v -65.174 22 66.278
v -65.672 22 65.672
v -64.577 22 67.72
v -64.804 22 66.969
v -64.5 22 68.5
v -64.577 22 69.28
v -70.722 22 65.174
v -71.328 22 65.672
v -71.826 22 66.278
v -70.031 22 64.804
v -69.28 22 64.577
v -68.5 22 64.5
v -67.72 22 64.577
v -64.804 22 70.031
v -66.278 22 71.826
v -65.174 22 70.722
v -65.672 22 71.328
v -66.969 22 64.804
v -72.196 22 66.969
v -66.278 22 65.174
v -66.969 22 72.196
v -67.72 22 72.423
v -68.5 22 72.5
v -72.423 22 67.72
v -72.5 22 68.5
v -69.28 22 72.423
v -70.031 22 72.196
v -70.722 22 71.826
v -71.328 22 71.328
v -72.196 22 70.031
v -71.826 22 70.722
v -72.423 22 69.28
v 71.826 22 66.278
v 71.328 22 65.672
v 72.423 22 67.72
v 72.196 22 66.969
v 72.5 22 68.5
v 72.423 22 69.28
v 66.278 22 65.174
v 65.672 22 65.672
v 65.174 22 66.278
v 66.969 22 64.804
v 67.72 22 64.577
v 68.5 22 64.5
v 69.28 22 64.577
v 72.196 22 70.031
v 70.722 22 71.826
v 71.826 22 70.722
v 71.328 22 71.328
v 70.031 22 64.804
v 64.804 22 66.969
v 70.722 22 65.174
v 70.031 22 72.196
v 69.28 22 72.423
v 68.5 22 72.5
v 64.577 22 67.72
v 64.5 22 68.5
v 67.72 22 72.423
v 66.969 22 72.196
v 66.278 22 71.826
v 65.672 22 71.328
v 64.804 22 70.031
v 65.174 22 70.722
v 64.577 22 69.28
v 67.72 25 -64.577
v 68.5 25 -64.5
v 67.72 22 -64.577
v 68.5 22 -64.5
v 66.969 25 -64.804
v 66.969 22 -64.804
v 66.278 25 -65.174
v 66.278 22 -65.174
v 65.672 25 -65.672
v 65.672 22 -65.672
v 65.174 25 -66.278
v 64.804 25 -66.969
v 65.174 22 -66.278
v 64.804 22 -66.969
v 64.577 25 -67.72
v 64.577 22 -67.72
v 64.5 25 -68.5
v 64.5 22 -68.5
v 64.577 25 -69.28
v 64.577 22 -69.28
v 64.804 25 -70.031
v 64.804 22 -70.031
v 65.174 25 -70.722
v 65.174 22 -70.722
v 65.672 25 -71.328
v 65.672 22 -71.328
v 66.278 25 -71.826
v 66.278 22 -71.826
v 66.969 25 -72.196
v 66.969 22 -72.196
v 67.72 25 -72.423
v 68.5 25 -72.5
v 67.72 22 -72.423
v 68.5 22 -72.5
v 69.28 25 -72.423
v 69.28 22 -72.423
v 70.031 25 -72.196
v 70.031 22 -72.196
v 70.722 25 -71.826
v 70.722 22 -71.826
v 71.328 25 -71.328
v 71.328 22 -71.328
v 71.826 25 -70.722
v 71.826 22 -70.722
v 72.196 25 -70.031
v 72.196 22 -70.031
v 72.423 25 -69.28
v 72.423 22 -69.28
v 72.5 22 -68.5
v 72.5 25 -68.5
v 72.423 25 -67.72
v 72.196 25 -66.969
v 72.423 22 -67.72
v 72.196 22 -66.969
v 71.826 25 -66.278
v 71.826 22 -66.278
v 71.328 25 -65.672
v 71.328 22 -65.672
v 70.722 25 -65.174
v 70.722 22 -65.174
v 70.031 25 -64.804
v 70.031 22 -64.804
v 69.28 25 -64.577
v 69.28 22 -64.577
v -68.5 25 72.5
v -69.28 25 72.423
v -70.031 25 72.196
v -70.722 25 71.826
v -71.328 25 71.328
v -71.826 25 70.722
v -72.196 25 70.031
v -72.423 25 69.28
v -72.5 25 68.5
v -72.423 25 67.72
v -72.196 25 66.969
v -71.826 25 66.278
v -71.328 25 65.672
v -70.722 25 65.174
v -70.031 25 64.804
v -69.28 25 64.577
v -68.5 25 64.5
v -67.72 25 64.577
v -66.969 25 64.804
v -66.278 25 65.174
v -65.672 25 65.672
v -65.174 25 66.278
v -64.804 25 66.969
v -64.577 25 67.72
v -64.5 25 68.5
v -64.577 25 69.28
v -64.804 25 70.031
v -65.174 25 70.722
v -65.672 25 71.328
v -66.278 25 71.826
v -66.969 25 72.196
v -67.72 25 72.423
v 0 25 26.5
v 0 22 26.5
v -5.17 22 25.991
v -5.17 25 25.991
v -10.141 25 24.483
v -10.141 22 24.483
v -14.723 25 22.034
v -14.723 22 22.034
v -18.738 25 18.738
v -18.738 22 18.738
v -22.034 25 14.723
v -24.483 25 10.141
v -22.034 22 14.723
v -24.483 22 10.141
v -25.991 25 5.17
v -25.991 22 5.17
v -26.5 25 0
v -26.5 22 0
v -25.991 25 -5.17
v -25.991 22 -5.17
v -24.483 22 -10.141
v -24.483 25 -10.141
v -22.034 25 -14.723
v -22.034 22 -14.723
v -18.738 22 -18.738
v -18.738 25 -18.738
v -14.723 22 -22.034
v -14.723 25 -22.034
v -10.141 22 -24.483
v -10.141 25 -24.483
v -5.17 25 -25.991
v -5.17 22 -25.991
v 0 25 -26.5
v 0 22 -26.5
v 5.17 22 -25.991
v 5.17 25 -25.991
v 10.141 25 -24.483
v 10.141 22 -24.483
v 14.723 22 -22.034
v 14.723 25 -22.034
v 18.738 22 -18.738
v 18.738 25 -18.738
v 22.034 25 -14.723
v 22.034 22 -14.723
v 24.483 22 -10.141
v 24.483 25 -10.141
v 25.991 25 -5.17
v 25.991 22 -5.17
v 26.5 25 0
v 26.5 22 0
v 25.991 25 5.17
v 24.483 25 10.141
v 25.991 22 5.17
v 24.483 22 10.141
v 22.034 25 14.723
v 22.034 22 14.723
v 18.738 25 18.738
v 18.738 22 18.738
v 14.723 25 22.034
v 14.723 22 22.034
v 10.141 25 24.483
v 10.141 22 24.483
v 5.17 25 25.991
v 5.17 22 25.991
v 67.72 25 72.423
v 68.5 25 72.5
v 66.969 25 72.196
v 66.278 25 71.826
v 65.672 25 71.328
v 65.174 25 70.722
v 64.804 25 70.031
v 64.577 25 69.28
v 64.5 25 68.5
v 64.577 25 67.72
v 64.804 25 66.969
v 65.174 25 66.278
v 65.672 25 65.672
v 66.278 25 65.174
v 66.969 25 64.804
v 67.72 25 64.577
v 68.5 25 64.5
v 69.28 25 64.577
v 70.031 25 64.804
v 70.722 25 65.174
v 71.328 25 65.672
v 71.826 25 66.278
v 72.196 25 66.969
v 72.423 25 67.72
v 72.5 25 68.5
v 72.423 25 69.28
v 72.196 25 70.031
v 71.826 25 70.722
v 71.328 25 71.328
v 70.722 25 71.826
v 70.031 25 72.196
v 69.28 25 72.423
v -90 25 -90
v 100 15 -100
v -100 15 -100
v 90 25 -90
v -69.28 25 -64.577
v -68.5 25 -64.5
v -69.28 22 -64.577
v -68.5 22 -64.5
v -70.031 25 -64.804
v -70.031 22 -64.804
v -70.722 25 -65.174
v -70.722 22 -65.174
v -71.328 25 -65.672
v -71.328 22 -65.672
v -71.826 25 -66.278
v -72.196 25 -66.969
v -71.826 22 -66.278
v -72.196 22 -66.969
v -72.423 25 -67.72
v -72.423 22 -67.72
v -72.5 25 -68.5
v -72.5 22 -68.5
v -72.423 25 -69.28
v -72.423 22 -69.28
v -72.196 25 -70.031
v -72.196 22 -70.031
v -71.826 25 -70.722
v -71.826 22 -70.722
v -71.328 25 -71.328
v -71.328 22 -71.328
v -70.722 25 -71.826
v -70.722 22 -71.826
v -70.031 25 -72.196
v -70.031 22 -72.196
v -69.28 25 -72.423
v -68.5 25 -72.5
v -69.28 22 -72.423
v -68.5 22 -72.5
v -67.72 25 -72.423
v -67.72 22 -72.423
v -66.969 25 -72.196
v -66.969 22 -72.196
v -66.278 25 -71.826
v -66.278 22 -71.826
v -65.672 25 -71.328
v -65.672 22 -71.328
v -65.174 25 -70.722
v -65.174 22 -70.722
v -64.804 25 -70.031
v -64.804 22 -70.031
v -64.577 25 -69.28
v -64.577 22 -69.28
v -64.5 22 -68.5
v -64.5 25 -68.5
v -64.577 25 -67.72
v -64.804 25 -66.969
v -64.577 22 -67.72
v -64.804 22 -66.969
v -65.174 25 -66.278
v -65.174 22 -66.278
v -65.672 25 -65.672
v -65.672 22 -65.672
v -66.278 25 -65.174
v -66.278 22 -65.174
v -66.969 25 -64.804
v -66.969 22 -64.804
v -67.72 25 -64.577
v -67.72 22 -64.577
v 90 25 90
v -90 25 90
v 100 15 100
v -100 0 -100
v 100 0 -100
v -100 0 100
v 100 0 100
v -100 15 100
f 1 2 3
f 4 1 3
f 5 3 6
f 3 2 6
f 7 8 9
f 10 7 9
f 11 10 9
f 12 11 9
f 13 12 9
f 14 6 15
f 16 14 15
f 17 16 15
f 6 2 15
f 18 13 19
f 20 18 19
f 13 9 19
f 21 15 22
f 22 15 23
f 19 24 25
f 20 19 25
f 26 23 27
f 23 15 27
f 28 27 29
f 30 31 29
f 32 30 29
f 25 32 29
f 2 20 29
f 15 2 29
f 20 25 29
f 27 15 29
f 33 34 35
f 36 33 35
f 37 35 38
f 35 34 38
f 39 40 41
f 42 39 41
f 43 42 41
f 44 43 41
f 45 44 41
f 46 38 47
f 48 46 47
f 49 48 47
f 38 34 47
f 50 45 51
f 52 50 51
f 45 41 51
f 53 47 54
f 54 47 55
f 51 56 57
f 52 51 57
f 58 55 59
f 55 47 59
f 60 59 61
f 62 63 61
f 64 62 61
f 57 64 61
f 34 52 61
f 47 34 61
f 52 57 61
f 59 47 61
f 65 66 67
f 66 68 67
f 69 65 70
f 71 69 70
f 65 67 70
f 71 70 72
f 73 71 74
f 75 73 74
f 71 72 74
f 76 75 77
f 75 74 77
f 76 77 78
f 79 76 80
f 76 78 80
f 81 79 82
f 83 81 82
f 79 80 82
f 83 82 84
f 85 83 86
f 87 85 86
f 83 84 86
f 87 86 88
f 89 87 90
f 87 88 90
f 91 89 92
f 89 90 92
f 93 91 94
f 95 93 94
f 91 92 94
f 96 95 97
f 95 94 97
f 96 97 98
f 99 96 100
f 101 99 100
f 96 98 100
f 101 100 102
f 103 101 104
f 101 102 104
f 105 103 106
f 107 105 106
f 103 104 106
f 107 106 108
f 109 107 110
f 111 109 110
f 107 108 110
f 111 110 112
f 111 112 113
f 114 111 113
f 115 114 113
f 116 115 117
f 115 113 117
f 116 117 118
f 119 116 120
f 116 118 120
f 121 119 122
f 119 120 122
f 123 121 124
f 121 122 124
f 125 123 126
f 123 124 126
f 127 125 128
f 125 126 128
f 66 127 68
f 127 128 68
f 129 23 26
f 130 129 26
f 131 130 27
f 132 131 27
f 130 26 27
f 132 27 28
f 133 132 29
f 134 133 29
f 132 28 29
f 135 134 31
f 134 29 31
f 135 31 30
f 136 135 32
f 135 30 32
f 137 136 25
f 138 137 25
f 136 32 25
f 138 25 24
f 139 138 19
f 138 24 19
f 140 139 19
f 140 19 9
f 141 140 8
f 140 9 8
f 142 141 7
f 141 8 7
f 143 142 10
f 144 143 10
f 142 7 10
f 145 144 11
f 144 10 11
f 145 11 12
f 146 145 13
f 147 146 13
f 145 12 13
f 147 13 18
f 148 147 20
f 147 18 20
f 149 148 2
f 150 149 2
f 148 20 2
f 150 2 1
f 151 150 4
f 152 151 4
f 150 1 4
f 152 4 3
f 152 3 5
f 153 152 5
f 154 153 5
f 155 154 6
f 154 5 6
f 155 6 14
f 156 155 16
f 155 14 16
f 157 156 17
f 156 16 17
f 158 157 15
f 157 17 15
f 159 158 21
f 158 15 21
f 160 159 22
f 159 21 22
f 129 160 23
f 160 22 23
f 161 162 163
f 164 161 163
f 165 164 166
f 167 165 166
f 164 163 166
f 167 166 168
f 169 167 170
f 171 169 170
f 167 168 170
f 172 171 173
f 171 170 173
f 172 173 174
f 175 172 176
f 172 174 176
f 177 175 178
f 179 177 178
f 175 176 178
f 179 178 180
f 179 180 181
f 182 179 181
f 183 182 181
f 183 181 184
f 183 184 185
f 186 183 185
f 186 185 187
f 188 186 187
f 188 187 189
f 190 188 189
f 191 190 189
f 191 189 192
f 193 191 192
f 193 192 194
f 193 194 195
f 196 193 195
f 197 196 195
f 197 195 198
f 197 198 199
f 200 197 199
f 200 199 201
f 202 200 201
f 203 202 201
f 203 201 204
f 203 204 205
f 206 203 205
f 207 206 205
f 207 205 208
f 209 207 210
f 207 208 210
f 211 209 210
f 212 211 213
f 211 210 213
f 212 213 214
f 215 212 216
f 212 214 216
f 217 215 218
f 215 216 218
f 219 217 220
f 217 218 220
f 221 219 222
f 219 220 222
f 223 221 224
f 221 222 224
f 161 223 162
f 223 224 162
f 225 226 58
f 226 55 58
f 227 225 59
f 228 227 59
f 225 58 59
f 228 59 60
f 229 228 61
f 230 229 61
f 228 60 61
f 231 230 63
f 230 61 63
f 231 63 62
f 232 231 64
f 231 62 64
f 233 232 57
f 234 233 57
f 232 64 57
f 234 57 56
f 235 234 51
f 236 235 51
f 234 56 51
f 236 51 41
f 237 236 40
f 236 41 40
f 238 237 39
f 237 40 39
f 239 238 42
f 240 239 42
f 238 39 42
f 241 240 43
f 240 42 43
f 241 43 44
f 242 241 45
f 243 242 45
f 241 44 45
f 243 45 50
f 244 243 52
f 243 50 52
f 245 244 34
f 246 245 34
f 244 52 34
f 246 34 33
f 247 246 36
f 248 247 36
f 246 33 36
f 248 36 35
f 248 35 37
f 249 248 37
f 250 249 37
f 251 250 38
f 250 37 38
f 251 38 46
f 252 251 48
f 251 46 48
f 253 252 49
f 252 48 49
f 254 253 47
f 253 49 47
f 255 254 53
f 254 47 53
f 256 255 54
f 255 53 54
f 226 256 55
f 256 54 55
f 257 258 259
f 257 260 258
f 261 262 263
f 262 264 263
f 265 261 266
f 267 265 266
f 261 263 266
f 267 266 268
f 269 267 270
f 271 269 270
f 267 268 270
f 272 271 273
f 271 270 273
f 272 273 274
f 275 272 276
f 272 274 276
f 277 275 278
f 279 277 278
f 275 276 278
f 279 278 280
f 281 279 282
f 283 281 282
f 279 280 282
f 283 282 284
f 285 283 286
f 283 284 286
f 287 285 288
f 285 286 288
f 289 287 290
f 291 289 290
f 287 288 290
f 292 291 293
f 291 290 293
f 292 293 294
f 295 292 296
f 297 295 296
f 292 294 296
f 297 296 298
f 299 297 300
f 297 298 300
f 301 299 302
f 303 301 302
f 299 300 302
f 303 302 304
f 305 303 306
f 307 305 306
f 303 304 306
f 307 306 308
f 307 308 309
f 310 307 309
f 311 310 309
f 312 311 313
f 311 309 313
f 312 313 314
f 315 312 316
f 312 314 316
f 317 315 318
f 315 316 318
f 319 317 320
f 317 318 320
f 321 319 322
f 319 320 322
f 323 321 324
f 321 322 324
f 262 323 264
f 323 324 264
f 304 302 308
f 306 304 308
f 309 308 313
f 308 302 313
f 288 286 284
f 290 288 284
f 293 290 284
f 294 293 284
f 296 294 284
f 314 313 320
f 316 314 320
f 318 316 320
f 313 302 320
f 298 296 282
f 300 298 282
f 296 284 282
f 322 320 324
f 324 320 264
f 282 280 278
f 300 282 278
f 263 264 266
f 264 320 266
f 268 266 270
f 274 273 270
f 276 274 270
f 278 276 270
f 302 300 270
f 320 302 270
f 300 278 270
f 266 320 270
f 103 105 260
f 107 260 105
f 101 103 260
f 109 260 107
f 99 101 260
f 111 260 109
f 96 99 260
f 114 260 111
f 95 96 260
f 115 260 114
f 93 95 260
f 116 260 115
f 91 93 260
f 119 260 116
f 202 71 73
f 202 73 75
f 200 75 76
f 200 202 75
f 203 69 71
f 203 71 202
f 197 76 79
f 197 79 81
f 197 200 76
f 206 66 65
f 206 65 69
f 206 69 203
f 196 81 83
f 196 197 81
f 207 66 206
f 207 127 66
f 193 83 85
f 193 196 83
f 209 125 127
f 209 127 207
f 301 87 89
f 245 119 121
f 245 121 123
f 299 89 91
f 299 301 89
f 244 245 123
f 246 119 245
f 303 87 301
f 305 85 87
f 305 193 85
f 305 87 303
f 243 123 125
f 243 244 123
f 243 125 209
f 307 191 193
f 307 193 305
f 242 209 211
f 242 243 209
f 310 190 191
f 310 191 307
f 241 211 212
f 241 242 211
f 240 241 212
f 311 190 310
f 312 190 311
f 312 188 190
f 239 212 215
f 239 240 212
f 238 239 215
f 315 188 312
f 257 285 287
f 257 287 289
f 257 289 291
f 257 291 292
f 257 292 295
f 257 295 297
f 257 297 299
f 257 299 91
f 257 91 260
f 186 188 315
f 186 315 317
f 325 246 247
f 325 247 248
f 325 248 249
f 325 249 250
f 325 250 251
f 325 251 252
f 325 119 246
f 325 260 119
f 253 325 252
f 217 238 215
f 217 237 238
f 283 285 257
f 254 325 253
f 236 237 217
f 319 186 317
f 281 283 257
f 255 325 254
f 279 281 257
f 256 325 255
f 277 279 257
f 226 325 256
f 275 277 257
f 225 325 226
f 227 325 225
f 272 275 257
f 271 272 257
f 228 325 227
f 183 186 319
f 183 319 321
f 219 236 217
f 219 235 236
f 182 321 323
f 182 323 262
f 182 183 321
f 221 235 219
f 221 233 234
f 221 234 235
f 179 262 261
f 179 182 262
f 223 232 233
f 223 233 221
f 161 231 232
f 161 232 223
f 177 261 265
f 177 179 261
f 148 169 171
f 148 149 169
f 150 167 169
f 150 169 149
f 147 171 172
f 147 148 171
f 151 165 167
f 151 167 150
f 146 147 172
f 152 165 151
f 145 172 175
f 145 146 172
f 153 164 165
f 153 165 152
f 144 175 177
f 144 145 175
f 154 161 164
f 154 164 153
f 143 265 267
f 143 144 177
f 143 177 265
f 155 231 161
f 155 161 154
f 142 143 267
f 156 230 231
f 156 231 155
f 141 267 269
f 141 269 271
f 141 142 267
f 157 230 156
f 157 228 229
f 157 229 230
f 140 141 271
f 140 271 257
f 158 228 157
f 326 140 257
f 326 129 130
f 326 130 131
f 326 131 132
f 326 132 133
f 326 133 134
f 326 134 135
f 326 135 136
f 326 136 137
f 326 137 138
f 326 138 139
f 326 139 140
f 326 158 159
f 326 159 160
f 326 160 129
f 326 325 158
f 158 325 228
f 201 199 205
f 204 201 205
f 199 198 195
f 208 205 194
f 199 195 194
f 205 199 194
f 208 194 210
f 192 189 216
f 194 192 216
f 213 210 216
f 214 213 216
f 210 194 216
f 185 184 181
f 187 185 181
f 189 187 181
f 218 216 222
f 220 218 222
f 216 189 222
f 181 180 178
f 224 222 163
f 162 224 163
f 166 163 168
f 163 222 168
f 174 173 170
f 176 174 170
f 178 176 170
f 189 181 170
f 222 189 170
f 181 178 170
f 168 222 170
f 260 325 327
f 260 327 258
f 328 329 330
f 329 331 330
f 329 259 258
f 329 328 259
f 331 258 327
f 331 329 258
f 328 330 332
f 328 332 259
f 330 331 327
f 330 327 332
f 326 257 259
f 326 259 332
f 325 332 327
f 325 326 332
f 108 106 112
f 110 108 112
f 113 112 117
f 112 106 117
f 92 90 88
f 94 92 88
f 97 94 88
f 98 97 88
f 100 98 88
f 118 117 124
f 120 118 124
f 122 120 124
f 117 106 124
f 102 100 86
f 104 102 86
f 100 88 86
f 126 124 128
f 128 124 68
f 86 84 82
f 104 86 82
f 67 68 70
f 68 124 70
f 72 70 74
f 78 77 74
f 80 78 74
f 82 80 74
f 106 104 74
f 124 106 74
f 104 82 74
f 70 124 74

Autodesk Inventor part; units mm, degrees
ref_plane "YZ Plane" through (0, 0, 0) normal (1, 0, 0) x (0, 1, 0)
ref_plane "XZ Plane" through (0, 0, 0) normal (0, 1, 0) x (-1, 0, 0)
ref_plane "XY Plane" through (0, 0, 0) normal (0, 0, 1) x (1, 0, 0)
sketch "Skizze1" plane through (0, 0, 0) normal (0, 1, 0) x (-1, 0, 0)
  line L0 (-100, 100) -> (100, 100)
  line L1 (100, 100) -> (100, -100)
  line L2 (100, -100) -> (-100, -100)
  line L3 (-100, -100) -> (-100, 100)
  line L4 (-100, 100) -> (100, -100) construction
  line L5 (100, 100) -> (-100, -100) construction
  point P0 (0, 0)
  dimension "d0" = 200
  dimension "d1" = 200
extrude "Extrusion1" add sketch "Skizze1" along normal blind 25
chamfer "Fasen1" distance 10 angle 45 4 edges at (100, 25, 0) (0, 25, 100) (0, 25, -100) (-100, 25, 0)
sketch "Skizze2" plane through (0, 25, 0) normal (0, 1, 0) x (1, 0, 0)
  point P0 (0, 0)
  point P1 (0, 0)
hole "Bohrung1" at (0, 25, 0) direction (0, -1, 0) diameter 53 depth 3
sketch "Skizze3" plane through (0, 25, 0) normal (0, 1, 0) x (1, 0, 0)
  line L0 (90, -90) -> (-90, -90) projected
  line L1 (0, -90) -> (0, 90) construction
  line L2 (-90, 90) -> (90, 90) projected
  line L3 (-90, -90) -> (-90, 90) projected
  line L4 (-90, 0) -> (90.2684, 0) construction
  point P0 (0, 0)
  point P1 (-68.5, -68.5)
  point P2 (68.5, -68.5)
  point P3 (68.5, 68.5)
  point P4 (-68.5, 68.5)
  point P5 (0.1342, 0)
  dimension "d21" = 68.5
  dimension "d22" = 68.5
  dimension "d23" = 137
  dimension "d24" = 68.5
  dimension "d25" = 68.5
hole "Bohrung2" at (-68.5, 25, 68.5) at (68.5, 25, 68.5) at (68.5, 25, -68.5) at (-68.5, 25, -68.5) direction (0, -1, 0) diameter 8 depth 3
properties part number "wooden support" material "Holz (Ahorn)"
